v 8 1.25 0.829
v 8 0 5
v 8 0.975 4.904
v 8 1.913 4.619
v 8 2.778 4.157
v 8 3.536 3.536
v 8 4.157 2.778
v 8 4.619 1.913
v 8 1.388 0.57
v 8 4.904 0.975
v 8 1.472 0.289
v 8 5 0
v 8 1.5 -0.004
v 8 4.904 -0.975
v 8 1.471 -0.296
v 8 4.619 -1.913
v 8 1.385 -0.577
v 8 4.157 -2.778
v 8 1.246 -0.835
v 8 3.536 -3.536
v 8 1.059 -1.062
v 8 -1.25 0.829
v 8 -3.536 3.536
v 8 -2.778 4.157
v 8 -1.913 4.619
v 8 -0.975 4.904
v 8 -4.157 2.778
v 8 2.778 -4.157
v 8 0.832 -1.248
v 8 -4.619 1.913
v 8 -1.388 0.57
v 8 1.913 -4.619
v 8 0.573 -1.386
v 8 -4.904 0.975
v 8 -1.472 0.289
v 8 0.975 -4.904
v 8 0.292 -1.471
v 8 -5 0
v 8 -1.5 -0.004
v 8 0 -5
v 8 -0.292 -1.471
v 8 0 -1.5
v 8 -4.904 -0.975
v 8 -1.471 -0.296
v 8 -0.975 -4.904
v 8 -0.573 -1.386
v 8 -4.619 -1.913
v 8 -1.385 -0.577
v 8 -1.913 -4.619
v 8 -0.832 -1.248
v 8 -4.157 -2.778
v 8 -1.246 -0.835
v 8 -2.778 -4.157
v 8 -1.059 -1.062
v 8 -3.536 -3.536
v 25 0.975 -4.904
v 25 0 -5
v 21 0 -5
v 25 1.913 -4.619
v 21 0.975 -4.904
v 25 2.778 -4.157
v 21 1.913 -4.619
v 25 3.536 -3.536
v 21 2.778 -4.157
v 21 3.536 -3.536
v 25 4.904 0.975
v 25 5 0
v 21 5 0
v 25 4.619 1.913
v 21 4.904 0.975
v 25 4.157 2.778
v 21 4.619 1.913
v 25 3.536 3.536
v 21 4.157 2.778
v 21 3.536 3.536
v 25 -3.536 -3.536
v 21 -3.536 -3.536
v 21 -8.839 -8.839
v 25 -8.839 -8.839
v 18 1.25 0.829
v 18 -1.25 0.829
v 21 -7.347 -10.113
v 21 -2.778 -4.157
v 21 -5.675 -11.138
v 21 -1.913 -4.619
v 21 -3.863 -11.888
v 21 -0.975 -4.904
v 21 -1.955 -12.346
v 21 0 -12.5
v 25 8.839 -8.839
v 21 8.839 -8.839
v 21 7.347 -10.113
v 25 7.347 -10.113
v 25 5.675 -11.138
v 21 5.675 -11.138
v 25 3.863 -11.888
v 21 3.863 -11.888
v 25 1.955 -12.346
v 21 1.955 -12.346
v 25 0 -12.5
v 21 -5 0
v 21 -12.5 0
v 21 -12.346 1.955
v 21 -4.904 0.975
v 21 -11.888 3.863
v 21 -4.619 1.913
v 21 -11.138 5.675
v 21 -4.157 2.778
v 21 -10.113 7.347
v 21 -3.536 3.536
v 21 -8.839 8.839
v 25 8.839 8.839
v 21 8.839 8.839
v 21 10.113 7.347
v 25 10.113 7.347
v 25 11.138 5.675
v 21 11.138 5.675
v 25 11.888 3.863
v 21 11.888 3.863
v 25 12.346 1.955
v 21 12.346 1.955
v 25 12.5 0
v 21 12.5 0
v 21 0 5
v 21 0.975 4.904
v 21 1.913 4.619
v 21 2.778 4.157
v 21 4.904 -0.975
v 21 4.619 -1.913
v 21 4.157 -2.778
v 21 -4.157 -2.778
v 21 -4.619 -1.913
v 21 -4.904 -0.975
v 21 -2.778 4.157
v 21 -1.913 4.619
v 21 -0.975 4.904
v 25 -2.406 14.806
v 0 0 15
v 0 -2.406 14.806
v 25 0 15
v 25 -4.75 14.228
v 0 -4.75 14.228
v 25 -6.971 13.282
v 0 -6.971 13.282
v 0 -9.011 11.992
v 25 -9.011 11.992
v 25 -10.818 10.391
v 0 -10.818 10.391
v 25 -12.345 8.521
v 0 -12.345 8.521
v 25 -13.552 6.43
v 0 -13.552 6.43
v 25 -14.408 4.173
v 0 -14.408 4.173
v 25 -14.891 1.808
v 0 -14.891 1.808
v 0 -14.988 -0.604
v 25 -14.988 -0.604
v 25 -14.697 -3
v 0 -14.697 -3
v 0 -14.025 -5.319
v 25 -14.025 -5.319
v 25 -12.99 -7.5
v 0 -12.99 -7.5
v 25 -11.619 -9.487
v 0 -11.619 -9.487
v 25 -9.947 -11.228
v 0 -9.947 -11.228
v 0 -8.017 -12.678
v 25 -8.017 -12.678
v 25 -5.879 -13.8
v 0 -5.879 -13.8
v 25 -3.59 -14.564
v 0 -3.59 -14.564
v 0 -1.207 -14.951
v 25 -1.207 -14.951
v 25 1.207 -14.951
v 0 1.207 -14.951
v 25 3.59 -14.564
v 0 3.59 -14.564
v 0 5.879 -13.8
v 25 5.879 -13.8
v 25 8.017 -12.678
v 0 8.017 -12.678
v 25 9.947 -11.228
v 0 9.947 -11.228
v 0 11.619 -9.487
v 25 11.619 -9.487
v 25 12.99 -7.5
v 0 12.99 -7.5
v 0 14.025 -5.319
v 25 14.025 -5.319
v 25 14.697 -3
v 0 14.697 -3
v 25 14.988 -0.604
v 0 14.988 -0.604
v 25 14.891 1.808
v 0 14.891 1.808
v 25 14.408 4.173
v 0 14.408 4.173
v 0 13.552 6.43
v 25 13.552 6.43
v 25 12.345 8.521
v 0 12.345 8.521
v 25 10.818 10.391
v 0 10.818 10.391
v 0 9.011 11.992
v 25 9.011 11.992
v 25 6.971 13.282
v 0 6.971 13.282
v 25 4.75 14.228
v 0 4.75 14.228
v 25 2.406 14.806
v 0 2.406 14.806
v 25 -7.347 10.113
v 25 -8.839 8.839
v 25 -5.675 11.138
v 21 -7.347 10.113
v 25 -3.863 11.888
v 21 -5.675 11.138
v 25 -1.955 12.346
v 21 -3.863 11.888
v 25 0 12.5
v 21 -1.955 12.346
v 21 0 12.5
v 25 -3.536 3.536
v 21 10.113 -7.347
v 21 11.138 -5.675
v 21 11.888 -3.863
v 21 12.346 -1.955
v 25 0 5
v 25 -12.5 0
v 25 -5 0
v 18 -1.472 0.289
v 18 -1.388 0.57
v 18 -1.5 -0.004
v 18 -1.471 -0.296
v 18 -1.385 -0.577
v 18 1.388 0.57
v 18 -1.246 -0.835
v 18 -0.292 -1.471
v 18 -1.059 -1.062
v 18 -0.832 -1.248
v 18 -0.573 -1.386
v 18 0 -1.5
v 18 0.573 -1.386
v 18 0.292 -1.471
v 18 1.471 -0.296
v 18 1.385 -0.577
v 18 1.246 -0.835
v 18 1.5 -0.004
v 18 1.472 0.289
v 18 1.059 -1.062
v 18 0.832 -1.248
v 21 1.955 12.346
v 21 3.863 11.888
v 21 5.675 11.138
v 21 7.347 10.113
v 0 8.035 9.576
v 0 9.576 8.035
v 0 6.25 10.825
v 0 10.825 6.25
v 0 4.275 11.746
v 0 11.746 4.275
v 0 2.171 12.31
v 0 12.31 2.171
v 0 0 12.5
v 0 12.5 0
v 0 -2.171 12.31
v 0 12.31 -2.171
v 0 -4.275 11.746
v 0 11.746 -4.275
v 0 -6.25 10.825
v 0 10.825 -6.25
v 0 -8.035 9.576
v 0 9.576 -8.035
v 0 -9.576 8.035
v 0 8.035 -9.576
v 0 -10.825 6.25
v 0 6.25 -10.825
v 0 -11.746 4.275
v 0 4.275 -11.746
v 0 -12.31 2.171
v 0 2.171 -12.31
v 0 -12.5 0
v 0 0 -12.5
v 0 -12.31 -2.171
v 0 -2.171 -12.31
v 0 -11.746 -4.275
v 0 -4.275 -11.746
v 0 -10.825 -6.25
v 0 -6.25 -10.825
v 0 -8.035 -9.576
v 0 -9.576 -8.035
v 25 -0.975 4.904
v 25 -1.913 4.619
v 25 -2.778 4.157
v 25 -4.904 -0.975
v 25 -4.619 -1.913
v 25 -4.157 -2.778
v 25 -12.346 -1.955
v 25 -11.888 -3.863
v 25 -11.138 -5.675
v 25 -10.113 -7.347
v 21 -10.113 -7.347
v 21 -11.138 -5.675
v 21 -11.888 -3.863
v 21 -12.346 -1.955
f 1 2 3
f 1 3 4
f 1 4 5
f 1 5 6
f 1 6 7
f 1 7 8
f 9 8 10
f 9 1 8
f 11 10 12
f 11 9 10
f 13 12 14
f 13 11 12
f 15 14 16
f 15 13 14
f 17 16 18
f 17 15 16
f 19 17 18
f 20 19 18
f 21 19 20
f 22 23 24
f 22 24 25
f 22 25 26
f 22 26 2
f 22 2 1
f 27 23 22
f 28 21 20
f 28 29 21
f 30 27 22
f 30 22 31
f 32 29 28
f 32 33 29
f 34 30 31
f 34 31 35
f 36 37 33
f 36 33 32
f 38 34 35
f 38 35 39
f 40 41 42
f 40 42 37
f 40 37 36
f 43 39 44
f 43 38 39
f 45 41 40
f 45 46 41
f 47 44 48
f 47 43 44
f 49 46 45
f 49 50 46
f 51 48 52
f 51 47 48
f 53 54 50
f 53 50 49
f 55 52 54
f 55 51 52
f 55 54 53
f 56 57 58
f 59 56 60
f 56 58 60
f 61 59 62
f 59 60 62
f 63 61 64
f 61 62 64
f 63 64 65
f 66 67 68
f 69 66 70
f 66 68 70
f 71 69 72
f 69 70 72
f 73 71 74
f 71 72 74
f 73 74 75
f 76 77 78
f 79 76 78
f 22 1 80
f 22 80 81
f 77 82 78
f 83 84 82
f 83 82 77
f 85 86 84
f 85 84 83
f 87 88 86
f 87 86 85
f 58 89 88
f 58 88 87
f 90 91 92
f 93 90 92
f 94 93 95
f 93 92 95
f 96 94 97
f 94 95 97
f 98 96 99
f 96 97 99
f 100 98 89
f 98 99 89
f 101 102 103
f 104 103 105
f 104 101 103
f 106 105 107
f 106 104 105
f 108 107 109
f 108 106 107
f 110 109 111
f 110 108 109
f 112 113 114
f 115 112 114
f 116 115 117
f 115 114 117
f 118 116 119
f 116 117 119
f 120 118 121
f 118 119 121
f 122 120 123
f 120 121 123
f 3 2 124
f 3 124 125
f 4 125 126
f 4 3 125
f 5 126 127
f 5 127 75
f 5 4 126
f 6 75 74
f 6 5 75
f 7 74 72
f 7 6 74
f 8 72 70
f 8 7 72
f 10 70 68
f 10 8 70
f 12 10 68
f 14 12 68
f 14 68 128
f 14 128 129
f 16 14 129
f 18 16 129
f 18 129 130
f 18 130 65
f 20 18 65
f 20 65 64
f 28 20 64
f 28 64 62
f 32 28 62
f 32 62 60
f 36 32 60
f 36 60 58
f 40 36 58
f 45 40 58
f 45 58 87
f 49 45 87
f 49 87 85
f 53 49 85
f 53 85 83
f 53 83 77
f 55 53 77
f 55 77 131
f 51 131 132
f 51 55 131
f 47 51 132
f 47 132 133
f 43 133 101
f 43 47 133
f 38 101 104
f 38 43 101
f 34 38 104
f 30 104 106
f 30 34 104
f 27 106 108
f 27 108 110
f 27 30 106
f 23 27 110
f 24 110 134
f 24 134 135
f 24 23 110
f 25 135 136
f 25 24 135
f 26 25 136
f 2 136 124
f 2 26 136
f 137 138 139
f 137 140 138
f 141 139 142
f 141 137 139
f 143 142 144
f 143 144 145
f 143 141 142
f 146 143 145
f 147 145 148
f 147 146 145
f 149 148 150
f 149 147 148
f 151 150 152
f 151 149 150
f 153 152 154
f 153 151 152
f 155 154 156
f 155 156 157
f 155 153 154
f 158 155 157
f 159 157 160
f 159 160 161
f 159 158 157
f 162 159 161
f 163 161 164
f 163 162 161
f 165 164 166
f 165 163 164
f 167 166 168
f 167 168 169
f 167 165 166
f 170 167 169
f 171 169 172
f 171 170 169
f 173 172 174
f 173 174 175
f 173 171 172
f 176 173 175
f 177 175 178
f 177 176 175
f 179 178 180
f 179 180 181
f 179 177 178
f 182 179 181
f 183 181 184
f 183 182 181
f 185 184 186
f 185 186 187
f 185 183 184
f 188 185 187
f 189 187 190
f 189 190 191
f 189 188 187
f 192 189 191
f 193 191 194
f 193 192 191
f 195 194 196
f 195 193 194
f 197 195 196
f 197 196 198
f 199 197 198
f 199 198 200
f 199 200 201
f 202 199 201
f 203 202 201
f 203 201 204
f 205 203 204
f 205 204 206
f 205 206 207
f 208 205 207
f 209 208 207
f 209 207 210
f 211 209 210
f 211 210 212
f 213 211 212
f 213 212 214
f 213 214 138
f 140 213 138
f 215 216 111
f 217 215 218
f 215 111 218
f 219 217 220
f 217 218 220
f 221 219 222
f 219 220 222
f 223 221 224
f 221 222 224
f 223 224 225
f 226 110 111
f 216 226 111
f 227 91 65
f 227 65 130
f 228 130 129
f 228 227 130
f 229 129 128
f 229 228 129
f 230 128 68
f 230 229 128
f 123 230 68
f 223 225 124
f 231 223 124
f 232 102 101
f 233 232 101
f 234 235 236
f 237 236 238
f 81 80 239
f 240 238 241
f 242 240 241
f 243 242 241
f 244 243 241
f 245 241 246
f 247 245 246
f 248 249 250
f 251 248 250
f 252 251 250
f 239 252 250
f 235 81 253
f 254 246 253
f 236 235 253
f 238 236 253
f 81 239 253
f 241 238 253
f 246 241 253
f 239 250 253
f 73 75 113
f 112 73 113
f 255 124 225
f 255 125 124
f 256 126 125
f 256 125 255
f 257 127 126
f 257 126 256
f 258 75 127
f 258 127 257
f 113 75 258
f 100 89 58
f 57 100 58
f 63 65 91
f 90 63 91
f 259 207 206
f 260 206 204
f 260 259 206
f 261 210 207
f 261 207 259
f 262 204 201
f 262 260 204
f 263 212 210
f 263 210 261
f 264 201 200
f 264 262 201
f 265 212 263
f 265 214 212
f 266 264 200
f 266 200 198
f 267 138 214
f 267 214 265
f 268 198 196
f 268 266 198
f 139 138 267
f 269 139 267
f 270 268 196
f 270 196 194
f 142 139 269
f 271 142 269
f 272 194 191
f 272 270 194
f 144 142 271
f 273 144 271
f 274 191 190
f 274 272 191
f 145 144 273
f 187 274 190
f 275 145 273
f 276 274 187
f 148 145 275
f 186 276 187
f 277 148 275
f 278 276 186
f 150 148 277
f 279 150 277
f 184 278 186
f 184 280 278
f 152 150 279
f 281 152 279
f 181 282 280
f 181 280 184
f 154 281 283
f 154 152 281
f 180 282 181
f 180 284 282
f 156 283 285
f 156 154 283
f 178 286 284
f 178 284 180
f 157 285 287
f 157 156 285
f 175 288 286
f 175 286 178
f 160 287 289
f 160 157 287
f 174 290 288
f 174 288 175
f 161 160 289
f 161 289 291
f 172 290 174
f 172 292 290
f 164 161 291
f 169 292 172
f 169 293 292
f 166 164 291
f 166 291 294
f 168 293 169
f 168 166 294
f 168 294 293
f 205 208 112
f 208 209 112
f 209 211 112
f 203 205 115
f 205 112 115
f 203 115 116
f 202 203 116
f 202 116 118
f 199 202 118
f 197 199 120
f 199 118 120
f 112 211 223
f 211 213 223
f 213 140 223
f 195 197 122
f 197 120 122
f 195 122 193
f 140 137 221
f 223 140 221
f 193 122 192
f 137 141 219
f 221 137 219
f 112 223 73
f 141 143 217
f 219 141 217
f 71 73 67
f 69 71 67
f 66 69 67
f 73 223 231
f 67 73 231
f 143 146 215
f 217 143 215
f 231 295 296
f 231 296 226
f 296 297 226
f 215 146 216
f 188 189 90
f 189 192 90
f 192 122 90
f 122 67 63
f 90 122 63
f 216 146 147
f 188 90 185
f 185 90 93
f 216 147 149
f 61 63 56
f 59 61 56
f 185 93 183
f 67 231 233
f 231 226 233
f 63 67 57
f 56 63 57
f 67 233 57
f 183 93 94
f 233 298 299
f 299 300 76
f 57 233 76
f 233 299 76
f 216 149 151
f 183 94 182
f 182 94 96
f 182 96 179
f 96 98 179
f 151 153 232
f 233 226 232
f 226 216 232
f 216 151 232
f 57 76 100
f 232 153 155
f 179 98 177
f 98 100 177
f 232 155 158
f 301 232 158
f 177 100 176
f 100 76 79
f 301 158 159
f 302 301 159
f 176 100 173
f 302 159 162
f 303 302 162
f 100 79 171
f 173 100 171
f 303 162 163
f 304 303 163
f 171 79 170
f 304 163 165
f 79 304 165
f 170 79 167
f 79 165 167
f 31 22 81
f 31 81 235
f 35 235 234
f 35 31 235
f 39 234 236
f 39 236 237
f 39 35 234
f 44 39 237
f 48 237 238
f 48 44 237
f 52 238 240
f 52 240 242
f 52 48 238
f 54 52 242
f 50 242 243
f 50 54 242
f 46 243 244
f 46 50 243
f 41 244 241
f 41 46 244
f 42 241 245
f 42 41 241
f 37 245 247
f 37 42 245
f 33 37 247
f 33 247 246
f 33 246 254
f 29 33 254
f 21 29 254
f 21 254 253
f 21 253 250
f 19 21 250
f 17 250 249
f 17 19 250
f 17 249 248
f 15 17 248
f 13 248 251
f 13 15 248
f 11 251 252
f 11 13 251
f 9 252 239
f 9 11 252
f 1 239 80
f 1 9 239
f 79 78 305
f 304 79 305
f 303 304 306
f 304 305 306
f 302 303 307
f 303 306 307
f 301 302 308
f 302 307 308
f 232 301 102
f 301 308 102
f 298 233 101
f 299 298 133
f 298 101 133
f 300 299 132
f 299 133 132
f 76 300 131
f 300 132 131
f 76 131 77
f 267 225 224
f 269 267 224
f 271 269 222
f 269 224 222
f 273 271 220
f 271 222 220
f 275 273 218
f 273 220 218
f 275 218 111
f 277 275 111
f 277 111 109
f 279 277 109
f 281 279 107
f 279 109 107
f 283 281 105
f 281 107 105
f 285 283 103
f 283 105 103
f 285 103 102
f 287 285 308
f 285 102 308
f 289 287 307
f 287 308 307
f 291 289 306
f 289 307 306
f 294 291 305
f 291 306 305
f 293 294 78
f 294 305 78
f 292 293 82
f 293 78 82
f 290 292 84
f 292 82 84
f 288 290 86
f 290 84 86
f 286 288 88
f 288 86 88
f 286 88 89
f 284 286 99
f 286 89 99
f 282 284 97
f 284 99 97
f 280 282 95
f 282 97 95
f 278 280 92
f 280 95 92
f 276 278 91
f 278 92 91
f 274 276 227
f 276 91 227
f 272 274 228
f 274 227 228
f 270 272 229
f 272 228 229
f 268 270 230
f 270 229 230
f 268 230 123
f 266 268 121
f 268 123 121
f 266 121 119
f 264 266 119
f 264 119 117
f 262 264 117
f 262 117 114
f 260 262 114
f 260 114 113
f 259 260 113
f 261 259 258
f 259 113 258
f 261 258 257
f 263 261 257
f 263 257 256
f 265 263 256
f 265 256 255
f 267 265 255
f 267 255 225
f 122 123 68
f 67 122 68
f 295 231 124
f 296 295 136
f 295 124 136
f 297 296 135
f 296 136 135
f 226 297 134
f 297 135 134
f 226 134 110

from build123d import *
from build123d.topology import SkipClean

# Parameters (mm, degrees)
SKETCH1_W          = 25
SKETCH1_H          = 2.5
SKETCH2_W          = 17
SKETCH2_H          = 12.5
CUT_EXTRUDE1_DEPTH = 10
SKETCH4_R          = 12.5
SKETCH4_R_2        = 5
CUT_EXTRUDE2_DEPTH = 13
CUT_EXTRUDE3_DEPTH = 30.849623113


with BuildPart() as part:
    # Sketch1 → Revolve1 (revolve)
    with BuildSketch(Plane.XY, mode=Mode.PRIVATE) as revolve1_sk:
        with Locations((12.5, 13.75)):
            Rectangle(SKETCH1_W, SKETCH1_H)
    revolve(revolve1_sk.sketch.rotate(Axis((0, 0, 0), (1, 0, 0)), 90), axis=Axis((0, 0, 0), (1, 0, 0)))

    # Sketch2 → Revolve2 (revolve)
    with BuildSketch(Plane.XY, mode=Mode.PRIVATE) as revolve2_sk:
        with Locations((16.5, 6.25)):
            Rectangle(SKETCH2_W, SKETCH2_H)
    revolve(revolve2_sk.sketch.rotate(Axis((0, 0, 0), (1, 0, 0)), 90), axis=Axis((0, 0, 0), (1, 0, 0)))

    # Sketch3 → Cut-Extrude1 (cut)
    with BuildSketch(Plane.ZY.offset(-8)):
        with BuildLine():
            Line((0.829156198, 1.25), (0.829156198, -1.25))
            ThreePointArc((0.829156198, -1.25), (-1.5, 0), (0.829156198, 1.25))
        make_face()
    extrude(amount=-CUT_EXTRUDE1_DEPTH, mode=Mode.SUBTRACT)

    # Sketch4 → Cut-Extrude2 (cut)
    with BuildSketch(Plane.ZY.offset(-8)):
        Circle(SKETCH4_R)
        Circle(SKETCH4_R_2, mode=Mode.SUBTRACT)
    extrude(amount=-CUT_EXTRUDE2_DEPTH, mode=Mode.SUBTRACT)

    # Sketch5 → Cut-Extrude3 (cut, through all)
    with SkipClean():  # the faces are left unmerged after this step: merging them gives an invalid solid
        with BuildSketch(Plane.ZY.offset(-21)):
            with BuildLine():
                Line((12.5, 0), (5, 0))
                ThreePointArc((5, 0), (4.619397663, -1.913417162), (3.535533906, -3.535533906))
                Line((3.535533906, -3.535533906), (8.838834765, -8.838834765))
                ThreePointArc((8.838834765, -8.838834765), (11.548494156, -4.783542905), (12.5, 0))
            make_face()
            with BuildLine():
                Line((-12.5, 0), (-5, 0))
                ThreePointArc((-5, 0), (-4.619397663, 1.913417162), (-3.535533906, 3.535533906))
                Line((-3.535533906, 3.535533906), (-8.838834765, 8.838834765))
                ThreePointArc((-8.838834765, 8.838834765), (-11.548494156, 4.783542905), (-12.5, 0))
            make_face()
            with BuildLine():
                ThreePointArc((0, 5), (1.913417162, 4.619397663), (3.535533906, 3.535533906))
                Line((3.535533906, 3.535533906), (8.838834765, 8.838834765))
                ThreePointArc((8.838834765, 8.838834765), (4.783542905, 11.548494156), (0, 12.5))
                Line((0, 12.5), (0, 5))
            make_face()
            with BuildLine():
                Line((0, -12.5), (0, -5))
                ThreePointArc((0, -5), (-1.913417162, -4.619397663), (-3.535533906, -3.535533906))
                Line((-3.535533906, -3.535533906), (-8.838834765, -8.838834765))
                ThreePointArc((-8.838834765, -8.838834765), (-4.783542905, -11.548494156), (0, -12.5))
            make_face()
        extrude(amount=-CUT_EXTRUDE3_DEPTH, mode=Mode.SUBTRACT)


solid = part.part
